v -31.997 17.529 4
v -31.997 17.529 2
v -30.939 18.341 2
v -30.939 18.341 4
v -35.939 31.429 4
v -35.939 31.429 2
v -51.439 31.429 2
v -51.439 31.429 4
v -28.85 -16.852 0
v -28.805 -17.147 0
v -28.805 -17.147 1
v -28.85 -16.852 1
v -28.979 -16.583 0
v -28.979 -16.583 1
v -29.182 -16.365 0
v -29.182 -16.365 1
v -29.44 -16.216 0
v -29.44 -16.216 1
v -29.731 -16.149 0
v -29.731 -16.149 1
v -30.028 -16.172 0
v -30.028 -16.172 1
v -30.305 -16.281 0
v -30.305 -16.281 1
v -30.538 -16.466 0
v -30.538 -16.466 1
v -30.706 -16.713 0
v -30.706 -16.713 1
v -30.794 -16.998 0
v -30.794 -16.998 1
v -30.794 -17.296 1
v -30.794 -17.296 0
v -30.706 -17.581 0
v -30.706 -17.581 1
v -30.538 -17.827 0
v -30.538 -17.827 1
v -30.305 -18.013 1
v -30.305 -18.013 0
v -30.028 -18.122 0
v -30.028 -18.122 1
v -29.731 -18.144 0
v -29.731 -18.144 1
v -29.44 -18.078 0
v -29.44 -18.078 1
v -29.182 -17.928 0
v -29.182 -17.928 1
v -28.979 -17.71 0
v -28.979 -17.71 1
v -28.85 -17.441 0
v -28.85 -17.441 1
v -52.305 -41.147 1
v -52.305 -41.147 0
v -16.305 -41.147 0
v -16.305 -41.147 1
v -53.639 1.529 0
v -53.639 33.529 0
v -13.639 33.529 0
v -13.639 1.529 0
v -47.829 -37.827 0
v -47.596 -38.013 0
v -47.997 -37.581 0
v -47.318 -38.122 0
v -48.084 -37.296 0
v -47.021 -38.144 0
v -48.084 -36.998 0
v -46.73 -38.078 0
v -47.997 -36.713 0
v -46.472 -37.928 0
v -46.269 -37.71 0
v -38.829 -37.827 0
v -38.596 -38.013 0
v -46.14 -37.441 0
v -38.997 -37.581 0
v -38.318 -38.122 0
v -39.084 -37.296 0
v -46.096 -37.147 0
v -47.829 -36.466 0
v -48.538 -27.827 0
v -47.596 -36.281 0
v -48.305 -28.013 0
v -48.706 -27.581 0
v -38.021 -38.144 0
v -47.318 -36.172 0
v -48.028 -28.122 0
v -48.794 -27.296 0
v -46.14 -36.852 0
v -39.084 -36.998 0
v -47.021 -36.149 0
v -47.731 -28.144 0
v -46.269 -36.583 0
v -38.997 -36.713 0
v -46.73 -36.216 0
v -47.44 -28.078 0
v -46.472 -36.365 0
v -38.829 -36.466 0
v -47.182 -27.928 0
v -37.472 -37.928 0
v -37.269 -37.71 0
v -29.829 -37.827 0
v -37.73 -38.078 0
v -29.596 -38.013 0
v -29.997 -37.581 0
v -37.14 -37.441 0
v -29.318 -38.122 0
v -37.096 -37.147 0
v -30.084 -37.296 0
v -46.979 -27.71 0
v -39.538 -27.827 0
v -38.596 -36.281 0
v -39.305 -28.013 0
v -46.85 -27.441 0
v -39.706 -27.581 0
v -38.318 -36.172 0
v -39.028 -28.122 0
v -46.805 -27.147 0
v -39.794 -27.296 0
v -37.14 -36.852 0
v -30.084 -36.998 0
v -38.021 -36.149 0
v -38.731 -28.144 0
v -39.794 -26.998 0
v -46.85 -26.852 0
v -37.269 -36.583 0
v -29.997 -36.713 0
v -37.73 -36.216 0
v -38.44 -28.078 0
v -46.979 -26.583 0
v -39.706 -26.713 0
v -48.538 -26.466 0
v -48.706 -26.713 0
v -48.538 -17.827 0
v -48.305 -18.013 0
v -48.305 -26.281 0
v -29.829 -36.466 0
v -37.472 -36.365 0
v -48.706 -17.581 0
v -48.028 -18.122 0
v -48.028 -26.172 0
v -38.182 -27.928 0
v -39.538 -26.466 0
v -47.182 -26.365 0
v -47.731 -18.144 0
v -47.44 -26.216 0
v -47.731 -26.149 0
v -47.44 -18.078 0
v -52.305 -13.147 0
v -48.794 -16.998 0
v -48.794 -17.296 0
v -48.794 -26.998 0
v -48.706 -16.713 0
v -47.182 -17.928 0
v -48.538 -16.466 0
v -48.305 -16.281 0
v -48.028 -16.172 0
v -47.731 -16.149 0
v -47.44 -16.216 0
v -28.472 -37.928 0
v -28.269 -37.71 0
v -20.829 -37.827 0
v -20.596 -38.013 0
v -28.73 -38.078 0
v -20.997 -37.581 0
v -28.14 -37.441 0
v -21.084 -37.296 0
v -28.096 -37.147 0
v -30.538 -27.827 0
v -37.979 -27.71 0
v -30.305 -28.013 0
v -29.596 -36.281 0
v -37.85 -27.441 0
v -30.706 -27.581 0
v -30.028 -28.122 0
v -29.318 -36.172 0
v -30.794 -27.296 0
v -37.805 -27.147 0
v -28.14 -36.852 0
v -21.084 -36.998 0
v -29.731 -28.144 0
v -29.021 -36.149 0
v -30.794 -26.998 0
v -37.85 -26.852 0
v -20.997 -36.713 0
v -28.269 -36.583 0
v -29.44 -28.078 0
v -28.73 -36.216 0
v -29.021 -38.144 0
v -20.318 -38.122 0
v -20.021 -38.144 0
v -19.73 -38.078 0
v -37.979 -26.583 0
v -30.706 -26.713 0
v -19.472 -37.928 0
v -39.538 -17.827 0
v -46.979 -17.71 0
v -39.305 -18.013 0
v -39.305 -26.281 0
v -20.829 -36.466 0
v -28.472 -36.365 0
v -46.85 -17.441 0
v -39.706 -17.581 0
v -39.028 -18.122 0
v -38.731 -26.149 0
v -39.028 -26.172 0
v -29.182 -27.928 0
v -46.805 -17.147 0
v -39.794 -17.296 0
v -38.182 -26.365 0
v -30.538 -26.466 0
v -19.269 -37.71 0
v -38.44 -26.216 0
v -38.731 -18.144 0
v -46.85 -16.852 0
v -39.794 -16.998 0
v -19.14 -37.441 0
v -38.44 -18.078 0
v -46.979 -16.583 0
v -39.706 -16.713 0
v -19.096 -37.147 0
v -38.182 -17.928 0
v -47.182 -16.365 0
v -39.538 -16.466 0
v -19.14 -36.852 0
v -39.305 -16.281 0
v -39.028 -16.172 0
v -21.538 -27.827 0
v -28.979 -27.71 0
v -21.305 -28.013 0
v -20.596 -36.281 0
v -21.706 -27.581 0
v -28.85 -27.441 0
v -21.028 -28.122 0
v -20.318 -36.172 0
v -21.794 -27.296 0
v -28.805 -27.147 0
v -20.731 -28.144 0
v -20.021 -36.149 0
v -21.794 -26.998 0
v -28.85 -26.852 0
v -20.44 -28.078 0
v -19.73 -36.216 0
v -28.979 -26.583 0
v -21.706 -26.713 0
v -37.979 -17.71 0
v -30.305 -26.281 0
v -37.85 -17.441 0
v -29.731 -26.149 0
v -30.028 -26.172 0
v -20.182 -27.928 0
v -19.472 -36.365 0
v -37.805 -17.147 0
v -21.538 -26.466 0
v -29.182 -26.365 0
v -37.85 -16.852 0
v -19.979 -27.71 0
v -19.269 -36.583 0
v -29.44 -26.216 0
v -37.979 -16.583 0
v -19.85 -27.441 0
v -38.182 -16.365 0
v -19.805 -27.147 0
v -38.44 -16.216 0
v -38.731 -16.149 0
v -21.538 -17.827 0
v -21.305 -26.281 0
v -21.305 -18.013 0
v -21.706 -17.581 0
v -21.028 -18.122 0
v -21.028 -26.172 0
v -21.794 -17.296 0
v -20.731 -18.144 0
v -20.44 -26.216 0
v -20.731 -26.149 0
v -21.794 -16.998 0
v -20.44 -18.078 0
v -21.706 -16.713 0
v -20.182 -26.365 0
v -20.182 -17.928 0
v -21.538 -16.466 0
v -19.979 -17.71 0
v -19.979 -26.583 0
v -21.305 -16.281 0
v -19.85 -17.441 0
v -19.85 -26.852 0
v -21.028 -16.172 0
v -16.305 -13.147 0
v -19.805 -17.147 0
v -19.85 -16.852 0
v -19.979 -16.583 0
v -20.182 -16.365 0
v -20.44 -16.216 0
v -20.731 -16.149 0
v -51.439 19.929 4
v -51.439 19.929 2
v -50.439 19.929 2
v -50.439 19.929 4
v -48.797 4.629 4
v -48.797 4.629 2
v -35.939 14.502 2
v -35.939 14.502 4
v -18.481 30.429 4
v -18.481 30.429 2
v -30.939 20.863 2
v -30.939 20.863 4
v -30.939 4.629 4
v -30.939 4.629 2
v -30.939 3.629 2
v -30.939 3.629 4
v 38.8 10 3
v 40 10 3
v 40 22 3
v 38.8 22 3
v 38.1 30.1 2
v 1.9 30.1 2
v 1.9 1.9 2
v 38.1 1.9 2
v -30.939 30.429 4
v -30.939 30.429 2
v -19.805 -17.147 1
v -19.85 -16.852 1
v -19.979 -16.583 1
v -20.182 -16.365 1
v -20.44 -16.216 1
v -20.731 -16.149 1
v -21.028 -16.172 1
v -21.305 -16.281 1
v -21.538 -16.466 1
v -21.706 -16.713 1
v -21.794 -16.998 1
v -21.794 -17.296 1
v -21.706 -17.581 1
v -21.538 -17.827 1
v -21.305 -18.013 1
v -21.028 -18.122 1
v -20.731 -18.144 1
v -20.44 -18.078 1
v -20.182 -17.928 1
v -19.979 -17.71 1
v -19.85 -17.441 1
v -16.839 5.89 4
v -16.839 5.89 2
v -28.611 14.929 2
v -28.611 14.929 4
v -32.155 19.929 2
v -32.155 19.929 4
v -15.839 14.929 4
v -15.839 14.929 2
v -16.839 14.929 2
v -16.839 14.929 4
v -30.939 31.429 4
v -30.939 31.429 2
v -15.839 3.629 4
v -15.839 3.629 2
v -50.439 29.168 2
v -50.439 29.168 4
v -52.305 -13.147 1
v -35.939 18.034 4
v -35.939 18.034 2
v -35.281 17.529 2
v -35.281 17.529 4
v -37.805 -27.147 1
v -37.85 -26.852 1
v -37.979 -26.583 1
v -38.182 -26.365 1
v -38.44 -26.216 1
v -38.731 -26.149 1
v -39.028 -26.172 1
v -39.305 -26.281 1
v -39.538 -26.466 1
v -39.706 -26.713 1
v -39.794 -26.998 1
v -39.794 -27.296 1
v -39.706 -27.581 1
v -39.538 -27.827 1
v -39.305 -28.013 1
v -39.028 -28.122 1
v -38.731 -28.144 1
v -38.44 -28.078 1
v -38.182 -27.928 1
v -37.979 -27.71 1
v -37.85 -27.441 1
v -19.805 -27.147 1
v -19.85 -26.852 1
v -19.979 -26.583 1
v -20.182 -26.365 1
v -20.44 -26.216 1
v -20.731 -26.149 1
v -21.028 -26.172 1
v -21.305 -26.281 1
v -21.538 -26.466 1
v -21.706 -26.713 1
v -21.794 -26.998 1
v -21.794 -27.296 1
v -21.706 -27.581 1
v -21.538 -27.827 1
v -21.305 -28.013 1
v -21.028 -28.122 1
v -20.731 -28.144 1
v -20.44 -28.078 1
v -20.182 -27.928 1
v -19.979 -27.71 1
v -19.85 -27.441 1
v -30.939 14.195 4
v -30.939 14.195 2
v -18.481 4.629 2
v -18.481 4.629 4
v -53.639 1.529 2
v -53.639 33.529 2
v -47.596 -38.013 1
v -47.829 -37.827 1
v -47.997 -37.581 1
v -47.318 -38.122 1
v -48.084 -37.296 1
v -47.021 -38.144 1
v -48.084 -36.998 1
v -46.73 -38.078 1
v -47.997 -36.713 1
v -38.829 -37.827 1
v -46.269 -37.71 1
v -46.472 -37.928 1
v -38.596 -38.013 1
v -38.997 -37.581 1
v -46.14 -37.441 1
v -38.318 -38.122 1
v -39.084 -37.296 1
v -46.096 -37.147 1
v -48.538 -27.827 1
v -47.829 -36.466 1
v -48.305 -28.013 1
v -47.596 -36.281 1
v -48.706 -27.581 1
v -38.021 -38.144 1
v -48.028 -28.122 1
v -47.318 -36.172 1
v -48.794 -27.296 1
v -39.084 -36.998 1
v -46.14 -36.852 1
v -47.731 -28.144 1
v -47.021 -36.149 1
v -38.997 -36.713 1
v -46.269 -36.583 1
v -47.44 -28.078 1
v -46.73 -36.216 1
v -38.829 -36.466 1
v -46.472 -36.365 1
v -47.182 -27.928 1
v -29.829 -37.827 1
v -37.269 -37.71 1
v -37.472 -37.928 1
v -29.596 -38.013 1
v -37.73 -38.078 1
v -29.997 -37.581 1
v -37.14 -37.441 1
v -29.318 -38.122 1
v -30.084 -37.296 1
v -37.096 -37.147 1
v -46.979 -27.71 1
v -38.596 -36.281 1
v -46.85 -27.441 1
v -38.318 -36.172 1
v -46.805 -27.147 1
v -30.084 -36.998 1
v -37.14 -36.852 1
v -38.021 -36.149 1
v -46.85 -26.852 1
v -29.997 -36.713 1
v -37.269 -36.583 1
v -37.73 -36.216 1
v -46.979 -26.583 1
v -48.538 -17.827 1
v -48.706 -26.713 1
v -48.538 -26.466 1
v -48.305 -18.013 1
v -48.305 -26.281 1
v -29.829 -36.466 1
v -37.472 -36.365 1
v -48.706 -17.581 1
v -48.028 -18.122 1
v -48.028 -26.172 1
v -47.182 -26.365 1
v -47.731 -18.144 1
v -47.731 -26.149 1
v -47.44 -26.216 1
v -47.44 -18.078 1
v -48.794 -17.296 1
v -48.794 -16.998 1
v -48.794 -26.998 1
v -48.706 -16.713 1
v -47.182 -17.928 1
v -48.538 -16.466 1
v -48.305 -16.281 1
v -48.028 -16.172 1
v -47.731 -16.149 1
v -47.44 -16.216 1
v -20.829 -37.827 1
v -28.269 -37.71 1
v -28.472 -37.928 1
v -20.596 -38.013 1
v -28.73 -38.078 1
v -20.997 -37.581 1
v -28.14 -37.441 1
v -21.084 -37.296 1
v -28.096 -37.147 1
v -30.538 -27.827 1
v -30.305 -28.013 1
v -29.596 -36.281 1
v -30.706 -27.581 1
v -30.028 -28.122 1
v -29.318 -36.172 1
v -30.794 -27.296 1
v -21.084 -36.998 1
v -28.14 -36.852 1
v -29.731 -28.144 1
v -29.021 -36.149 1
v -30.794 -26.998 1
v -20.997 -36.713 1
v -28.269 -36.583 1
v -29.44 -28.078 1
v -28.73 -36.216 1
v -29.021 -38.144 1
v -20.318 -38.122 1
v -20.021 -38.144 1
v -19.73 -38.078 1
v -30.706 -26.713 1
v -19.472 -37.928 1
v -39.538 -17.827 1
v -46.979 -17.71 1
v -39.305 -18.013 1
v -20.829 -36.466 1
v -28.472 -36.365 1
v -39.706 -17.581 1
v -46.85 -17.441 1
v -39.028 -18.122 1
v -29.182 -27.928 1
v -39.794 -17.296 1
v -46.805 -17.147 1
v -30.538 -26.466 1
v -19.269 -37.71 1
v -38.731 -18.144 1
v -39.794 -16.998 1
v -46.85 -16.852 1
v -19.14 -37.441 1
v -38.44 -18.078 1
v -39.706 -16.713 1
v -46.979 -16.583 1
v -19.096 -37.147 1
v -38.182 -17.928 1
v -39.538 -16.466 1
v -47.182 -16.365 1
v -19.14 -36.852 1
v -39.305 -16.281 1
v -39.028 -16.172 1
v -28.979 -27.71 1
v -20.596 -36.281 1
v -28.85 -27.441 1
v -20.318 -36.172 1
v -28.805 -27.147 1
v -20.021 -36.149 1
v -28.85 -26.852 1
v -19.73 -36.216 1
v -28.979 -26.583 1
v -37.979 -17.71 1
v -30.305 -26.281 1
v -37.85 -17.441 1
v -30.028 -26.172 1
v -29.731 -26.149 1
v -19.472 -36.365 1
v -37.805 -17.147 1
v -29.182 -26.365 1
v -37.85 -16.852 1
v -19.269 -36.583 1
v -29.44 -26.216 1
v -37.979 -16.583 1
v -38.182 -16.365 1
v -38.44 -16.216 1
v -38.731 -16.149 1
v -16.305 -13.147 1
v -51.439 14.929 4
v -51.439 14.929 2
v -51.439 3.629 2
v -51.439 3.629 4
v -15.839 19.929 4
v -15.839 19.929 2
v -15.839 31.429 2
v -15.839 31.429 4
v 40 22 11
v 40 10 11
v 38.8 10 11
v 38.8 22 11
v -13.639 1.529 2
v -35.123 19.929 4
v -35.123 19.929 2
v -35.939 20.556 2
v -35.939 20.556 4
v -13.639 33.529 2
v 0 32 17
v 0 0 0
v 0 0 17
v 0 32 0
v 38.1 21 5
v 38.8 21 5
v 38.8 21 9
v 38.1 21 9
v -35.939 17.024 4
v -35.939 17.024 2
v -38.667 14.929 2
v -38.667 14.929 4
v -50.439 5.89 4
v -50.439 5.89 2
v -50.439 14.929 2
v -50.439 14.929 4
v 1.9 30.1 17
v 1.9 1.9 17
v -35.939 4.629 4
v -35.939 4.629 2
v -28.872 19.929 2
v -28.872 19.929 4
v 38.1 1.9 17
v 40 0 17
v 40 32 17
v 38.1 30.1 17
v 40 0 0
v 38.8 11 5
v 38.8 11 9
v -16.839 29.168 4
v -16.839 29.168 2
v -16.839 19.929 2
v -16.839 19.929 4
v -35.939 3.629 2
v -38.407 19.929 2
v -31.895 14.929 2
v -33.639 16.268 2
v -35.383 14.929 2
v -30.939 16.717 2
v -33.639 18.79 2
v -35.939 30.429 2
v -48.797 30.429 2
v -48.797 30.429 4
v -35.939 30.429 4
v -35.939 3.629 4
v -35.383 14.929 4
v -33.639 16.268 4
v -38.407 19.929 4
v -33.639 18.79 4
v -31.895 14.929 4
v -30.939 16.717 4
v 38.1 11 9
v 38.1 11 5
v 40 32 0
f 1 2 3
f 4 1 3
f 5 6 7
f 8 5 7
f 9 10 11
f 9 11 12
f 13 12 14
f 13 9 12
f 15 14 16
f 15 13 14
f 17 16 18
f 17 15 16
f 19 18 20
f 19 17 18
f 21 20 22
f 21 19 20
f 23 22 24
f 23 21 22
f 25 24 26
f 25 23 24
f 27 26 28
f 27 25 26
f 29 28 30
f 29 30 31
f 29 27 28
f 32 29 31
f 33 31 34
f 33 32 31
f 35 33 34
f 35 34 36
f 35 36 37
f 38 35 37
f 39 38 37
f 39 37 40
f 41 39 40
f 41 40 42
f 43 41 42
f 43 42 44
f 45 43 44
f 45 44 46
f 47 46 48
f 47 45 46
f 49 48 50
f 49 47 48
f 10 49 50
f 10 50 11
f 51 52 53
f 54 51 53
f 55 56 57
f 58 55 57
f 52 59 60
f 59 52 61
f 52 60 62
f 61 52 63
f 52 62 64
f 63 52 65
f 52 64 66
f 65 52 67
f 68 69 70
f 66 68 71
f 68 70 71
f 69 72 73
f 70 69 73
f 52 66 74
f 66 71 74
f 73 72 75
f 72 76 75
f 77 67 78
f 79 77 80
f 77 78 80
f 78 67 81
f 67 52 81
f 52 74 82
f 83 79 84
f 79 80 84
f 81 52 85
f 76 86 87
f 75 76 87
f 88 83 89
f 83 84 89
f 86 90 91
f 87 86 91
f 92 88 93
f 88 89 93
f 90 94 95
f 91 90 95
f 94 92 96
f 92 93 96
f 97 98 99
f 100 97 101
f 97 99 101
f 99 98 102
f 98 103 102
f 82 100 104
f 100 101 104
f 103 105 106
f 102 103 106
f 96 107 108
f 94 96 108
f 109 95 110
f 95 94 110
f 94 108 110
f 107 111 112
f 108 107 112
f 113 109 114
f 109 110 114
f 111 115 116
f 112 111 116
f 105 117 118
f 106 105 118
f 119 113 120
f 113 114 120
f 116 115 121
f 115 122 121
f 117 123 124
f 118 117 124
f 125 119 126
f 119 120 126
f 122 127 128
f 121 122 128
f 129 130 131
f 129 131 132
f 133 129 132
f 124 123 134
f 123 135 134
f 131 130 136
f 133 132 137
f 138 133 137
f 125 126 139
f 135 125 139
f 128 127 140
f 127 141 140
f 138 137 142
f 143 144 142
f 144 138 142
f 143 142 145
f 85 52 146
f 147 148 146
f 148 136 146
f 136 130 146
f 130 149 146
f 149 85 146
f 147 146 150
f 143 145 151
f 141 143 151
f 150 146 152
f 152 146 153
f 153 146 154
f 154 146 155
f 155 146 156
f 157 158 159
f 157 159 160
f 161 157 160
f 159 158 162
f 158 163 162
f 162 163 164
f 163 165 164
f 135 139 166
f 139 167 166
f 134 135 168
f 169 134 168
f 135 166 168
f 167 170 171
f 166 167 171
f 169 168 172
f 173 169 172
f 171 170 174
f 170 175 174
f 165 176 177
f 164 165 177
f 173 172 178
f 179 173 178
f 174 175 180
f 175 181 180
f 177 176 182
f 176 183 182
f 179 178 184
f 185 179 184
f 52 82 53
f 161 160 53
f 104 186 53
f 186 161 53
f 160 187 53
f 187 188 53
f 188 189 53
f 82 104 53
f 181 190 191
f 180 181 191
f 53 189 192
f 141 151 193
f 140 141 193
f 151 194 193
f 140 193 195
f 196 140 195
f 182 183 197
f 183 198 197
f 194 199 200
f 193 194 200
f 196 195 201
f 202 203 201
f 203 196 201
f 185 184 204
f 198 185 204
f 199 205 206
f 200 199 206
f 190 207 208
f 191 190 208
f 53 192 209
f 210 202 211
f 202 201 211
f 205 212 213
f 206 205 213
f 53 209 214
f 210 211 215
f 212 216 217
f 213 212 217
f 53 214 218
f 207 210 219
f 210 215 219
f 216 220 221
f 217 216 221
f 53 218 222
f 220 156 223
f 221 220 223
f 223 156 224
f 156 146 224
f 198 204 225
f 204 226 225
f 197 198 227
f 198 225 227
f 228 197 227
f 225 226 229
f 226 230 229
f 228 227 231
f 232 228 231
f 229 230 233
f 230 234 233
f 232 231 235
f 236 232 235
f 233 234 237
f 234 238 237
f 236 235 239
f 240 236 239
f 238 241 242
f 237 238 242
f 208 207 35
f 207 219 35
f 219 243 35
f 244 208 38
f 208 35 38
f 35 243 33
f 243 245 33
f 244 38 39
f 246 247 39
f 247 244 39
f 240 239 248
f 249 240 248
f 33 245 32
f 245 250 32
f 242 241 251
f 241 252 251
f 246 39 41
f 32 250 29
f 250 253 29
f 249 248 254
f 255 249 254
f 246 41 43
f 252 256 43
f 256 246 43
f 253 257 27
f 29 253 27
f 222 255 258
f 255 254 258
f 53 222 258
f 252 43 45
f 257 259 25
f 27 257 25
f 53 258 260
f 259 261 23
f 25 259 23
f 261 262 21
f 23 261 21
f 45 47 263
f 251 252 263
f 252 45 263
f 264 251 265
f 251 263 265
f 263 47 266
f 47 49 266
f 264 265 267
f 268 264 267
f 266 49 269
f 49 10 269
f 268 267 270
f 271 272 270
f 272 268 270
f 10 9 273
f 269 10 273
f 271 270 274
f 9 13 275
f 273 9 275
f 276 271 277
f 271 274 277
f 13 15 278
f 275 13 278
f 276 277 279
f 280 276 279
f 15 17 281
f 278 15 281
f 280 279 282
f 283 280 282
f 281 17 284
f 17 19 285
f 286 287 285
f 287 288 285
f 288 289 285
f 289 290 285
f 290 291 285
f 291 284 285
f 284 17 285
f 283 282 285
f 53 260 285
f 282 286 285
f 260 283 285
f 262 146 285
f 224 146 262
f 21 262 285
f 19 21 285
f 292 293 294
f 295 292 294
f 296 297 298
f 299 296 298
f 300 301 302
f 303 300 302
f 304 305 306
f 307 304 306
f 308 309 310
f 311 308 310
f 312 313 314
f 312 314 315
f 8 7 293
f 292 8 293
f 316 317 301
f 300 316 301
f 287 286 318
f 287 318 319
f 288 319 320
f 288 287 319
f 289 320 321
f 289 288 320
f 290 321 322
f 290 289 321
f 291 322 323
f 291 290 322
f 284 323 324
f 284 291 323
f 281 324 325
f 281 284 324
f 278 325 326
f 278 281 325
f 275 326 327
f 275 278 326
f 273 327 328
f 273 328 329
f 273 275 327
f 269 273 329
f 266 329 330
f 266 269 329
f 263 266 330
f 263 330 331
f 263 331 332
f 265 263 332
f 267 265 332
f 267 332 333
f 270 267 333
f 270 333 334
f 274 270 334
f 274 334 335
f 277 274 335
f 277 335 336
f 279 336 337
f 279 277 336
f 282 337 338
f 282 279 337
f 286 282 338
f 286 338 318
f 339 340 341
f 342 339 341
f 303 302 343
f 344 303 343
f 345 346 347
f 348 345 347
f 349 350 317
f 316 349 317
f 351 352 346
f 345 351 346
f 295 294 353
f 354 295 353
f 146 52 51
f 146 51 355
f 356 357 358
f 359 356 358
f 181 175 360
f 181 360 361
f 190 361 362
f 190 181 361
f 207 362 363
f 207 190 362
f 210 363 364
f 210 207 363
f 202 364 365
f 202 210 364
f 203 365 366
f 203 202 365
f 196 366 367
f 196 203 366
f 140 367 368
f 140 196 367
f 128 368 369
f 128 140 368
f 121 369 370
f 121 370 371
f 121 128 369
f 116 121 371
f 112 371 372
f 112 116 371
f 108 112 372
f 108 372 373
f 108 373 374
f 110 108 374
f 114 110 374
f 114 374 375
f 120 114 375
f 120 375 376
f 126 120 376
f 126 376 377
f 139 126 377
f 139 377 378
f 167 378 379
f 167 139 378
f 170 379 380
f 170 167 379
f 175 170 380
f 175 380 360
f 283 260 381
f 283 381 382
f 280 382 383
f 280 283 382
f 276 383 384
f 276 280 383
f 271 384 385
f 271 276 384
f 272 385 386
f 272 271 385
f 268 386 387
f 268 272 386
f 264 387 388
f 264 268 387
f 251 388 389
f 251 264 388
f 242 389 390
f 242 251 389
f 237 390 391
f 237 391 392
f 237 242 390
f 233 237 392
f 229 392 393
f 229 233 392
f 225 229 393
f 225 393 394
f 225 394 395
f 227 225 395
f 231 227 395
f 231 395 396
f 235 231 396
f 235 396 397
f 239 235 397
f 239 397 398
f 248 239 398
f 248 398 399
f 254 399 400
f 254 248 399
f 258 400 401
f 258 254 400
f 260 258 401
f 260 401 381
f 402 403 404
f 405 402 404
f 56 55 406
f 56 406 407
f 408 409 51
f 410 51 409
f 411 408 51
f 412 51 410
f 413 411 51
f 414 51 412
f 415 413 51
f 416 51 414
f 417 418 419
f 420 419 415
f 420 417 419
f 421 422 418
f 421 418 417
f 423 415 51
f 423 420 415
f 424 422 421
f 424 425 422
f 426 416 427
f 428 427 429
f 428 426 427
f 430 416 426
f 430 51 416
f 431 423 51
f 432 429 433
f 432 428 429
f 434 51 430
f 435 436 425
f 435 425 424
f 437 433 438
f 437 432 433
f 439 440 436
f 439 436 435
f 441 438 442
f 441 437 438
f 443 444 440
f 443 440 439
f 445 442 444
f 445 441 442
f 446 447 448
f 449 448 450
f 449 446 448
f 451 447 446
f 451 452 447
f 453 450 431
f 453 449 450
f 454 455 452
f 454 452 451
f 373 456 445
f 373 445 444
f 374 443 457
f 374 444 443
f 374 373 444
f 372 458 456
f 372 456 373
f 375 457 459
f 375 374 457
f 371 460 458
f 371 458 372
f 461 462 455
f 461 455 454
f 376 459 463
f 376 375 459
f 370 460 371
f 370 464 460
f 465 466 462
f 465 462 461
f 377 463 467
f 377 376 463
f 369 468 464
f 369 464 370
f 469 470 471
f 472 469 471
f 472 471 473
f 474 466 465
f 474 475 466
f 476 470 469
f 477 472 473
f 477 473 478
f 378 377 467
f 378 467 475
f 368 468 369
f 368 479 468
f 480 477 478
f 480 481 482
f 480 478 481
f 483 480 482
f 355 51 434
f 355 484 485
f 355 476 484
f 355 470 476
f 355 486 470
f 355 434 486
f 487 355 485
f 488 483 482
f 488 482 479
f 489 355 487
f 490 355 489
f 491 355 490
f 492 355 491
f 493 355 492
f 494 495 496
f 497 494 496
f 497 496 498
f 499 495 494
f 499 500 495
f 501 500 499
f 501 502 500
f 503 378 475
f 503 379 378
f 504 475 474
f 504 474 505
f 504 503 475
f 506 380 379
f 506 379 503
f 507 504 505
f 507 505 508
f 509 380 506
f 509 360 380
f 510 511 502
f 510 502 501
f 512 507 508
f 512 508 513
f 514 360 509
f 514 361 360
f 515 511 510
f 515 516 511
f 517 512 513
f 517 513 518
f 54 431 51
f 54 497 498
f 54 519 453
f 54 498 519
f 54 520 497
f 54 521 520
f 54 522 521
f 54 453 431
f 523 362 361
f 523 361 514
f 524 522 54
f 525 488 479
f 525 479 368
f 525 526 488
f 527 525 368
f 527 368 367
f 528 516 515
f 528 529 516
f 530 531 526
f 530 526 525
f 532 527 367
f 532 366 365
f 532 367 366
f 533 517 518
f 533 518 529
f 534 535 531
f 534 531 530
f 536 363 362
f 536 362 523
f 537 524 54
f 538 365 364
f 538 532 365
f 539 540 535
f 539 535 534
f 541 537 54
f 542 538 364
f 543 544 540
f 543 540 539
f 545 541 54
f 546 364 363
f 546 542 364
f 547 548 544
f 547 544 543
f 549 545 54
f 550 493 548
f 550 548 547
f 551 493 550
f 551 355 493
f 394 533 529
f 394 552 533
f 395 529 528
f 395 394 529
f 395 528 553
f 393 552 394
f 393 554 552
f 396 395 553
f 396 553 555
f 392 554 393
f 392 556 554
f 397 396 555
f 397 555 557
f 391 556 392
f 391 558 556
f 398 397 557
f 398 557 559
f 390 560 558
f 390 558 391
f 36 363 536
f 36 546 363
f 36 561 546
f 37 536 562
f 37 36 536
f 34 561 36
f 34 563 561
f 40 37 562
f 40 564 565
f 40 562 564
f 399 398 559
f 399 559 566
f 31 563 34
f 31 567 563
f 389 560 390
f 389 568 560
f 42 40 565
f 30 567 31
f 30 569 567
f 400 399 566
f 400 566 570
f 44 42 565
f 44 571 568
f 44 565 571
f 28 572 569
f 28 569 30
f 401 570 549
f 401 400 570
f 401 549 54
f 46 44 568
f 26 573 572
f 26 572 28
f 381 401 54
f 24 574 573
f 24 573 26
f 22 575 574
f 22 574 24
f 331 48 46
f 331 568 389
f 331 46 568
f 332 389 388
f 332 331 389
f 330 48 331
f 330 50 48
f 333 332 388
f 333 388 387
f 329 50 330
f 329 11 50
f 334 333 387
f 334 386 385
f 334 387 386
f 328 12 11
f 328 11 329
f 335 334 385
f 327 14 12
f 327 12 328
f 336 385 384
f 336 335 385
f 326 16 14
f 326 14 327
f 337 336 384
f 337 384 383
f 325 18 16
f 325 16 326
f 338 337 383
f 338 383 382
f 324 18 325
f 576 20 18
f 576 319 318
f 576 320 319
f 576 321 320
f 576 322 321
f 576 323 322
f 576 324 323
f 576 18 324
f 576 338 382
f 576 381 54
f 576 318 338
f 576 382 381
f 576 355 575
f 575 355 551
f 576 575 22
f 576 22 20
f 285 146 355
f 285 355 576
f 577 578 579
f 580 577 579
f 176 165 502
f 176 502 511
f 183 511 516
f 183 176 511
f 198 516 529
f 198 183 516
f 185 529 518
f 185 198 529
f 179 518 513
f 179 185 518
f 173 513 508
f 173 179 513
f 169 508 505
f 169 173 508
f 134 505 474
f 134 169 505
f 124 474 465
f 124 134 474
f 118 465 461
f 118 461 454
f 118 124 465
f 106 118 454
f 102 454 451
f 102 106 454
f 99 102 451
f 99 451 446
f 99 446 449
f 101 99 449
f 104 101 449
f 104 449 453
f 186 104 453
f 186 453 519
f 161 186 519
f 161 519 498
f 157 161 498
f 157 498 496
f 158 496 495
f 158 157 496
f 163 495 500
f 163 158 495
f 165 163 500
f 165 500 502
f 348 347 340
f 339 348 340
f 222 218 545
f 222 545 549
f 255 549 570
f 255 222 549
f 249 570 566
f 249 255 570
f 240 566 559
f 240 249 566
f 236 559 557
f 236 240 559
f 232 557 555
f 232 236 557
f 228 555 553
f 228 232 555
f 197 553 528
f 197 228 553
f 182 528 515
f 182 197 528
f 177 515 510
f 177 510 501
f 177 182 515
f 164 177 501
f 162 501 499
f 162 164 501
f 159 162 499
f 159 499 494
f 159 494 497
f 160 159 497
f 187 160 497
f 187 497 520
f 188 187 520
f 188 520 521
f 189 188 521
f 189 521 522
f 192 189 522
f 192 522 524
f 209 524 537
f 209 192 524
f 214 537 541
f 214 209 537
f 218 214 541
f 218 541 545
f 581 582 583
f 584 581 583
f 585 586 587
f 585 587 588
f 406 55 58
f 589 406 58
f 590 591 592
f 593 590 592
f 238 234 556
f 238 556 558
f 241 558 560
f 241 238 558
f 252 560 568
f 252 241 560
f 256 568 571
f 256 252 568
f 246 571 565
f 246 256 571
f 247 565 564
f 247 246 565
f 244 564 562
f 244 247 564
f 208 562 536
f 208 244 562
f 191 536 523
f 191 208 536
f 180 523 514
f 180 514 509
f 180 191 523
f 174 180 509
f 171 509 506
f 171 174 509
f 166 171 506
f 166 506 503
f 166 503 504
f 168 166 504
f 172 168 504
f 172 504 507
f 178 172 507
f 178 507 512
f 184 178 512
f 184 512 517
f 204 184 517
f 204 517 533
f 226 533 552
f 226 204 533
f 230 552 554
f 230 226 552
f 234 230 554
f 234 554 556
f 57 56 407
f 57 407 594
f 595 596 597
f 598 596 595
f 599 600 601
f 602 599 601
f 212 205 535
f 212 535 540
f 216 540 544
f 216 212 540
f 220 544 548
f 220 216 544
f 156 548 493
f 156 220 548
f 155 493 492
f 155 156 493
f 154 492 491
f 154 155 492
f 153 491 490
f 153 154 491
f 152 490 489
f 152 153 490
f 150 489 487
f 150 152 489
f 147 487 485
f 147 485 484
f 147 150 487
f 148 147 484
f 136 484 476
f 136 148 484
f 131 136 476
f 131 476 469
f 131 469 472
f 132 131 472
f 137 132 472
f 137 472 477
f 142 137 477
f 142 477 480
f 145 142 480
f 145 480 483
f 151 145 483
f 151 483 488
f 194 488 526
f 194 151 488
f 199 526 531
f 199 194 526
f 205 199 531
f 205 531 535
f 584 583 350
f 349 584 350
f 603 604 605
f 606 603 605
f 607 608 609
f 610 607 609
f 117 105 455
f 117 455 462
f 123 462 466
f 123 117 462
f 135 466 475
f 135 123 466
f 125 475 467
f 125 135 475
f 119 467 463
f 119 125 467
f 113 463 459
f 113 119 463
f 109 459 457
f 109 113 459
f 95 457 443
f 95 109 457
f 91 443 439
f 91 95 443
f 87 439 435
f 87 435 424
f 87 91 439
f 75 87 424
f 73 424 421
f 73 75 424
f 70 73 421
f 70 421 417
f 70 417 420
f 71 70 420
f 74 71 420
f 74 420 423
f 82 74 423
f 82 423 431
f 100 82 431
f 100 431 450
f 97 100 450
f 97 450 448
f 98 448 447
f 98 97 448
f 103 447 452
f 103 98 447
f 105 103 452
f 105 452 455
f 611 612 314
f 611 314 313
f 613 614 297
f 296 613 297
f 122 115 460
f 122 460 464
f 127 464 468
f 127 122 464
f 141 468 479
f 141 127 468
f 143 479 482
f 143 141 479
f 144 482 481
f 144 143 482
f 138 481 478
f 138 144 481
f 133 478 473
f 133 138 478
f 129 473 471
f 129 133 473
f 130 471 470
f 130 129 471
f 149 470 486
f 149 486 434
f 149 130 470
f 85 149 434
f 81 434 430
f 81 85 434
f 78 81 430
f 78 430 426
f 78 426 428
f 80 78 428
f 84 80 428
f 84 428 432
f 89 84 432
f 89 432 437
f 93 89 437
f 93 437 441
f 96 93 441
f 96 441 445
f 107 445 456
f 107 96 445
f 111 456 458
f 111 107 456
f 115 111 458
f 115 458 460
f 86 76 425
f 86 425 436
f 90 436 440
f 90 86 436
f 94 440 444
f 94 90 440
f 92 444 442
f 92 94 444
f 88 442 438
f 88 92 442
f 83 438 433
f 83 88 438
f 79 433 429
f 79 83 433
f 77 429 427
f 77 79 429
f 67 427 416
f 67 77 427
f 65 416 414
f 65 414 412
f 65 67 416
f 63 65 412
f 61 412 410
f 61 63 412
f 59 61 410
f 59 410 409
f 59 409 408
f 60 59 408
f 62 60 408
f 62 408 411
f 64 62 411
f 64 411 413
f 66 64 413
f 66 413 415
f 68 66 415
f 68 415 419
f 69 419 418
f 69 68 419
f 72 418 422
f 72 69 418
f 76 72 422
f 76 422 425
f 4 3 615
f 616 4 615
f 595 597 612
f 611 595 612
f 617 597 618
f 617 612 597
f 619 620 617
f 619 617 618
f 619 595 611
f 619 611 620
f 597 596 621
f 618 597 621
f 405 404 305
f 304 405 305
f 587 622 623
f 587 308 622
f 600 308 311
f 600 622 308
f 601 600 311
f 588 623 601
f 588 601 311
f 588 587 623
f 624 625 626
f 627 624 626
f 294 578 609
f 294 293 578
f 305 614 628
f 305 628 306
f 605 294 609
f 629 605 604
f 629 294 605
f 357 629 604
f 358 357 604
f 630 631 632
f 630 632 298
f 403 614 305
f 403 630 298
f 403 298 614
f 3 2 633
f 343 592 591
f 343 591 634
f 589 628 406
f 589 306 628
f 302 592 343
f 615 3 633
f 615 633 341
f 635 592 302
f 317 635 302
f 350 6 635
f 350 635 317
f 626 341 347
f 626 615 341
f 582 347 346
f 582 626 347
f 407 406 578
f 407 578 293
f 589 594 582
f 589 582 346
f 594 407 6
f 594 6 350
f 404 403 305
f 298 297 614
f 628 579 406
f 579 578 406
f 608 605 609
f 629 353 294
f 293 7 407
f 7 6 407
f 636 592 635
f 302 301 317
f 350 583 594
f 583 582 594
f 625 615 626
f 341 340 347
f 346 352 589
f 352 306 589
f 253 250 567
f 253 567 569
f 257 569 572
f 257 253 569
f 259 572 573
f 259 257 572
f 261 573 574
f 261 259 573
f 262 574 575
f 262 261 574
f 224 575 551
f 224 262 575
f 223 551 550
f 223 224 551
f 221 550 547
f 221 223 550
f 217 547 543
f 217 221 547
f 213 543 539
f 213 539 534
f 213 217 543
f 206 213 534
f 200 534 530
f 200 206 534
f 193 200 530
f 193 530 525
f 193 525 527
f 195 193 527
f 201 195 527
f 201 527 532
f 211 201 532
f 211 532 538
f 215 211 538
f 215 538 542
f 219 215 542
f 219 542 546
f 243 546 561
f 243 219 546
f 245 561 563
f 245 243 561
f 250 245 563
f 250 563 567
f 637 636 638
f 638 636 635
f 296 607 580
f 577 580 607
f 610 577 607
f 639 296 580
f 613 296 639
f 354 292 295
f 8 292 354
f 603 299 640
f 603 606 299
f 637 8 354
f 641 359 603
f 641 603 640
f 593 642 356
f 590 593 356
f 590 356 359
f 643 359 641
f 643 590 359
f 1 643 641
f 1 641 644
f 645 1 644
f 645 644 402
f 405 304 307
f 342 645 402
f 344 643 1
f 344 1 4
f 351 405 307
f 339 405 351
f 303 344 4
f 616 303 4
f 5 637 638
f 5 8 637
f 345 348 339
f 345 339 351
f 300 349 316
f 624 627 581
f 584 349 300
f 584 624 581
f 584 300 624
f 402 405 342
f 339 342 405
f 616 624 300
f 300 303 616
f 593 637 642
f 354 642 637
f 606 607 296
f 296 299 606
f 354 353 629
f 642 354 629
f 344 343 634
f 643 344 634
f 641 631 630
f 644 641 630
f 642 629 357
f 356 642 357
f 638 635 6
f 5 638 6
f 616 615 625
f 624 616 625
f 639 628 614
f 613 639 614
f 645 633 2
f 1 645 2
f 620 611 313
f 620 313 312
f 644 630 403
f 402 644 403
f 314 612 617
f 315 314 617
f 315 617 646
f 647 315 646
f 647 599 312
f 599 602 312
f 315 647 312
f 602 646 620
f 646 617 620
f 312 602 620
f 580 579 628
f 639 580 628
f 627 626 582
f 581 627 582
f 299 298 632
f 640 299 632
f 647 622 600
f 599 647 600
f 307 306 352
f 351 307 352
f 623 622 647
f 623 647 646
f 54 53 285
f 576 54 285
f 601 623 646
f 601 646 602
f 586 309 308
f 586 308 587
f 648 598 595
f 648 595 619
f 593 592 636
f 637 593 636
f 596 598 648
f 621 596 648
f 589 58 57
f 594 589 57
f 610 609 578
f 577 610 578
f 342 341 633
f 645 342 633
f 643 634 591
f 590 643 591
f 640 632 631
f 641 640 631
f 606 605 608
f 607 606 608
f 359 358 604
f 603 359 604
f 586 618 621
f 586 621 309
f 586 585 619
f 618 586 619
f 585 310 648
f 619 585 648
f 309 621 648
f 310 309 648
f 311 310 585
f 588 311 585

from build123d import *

# Parameters (mm, degrees)
F0_W      = 40
F0_H      = 32
F1_DEPTH  = 17
F2_W      = 36.2
F2_H      = 28.2
F3_DEPTH  = 15
F4_W      = 10
F4_H      = 4
F5_DEPTH  = 1.9
F6_W      = 40
F6_H      = 32
F7_DEPTH  = 2
F9_DEPTH  = 2
F4_W_2    = 12
F4_H_2    = 8
F10_DEPTH = 1.2
F11_W     = 36
F11_H     = 28
F11_R     = 1
F12_DEPTH = 1


with BuildPart() as f1:
    # F0 (on Top) → F1 (new body)
    with BuildSketch(Plane.XY):
        with Locations((20, 16)):
            Rectangle(F0_W, F0_H)
    extrude(amount=F1_DEPTH)

    # F2 (on face) → F3 (cut)
    with BuildSketch(Plane.XY.offset(17)):
        with Locations((20, 16)):
            Rectangle(F2_W, F2_H)
    extrude(amount=-F3_DEPTH, mode=Mode.SUBTRACT)

    # F4 (on face) → F5 (cut, through all)
    with BuildSketch(Plane.YZ.offset(40)):
        with Locations((16, 7)):
            Rectangle(F4_W, F4_H)
    extrude(amount=-F5_DEPTH, mode=Mode.SUBTRACT)

    # F4 (on face) → F10 (cut)
    with BuildSketch(Plane.YZ.offset(40)):
        with Locations((16, 7)):
            Rectangle(F4_W_2, F4_H_2)
        with Locations((16, 7)):
            Rectangle(F4_W, F4_H, mode=Mode.SUBTRACT)
    extrude(amount=-F10_DEPTH, mode=Mode.SUBTRACT)


with BuildPart() as f7:
    # F6 (on Top) → F7 (new body)
    with BuildSketch(Plane.XY):
        with Locations((-33.6390890081, 17.5289876275)):
            Rectangle(F6_W, F6_H)
    extrude(amount=F7_DEPTH)

    # F8 (on face) → F9 (join)
    with BuildSketch(Plane.XY.offset(2)):
        Polygon((-35.9390890081, 31.4289876275), (-51.4390890081, 31.4289876275), (-51.4390890081, 19.9289876275), (-50.4390890081, 19.9289876275), (-50.4390890081, 29.1681924055), (-50.4390890081, 30.4289876275), (-48.7971231376, 30.4289876275), (-35.9390890081, 30.4289876275), align=None)
        Polygon((-15.8390890081, 31.4289876275), (-30.9390890081, 31.4289876275), (-30.9390890081, 30.4289876275), (-18.4810548786, 30.4289876275), (-16.8390890081, 30.4289876275), (-16.8390890081, 29.1681924055), (-16.8390890081, 19.9289876275), (-15.8390890081, 19.9289876275), align=None)
        Polygon((-50.4390890081, 30.4289876275), (-50.4390890081, 29.1681924055), (-38.406636274, 19.9289876275), (-36.7646704035, 19.9289876275), align=None)
        Polygon((-35.9390890081, 20.5558542781), (-48.7971231376, 30.4289876275), (-50.4390890081, 30.4289876275), (-36.7646704035, 19.9289876275), (-35.9390890081, 19.9289876275), align=None)
        Polygon((-32.8181060728, 18.1593852385), (-33.6390890081, 18.7897828495), (-34.4600719434, 18.1593852385), (-33.6390890081, 17.5289876275), align=None)
        Polygon((-31.9971231376, 17.5289876275), (-32.8181060728, 18.1593852385), (-33.6390890081, 17.5289876275), (-32.8181060728, 16.8985900165), align=None)
        Polygon((-34.4600719434, 18.1593852385), (-35.2810548786, 17.5289876275), (-34.4600719434, 16.8985900165), (-33.6390890081, 17.5289876275), align=None)
        Polygon((-33.6390890081, 17.5289876275), (-34.4600719434, 16.8985900165), (-33.6390890081, 16.2681924055), (-32.8181060728, 16.8985900165), align=None)
        Polygon((-30.9390890081, 18.3414066912), (-30.9390890081, 19.6022019132), (-32.8181060728, 18.1593852385), (-31.9971231376, 17.5289876275), align=None)
        Polygon((-30.9390890081, 19.9289876275), (-32.1554734833, 19.9289876275), (-33.6390890081, 18.7897828495), (-32.8181060728, 18.1593852385), (-30.9390890081, 19.6022019132), align=None)
        Polygon((-35.2810548786, 17.5289876275), (-35.9390890081, 17.0237114209), (-35.9390890081, 15.7629161989), (-34.4600719434, 16.8985900165), align=None)
        Polygon((-34.4600719434, 16.8985900165), (-35.9390890081, 15.7629161989), (-35.9390890081, 14.9289876275), (-35.3831696492, 14.9289876275), (-33.6390890081, 16.2681924055), align=None)
        Polygon((-30.9390890081, 14.1949781198), (-18.4810548786, 4.6289876275), (-16.8390890081, 4.6289876275), (-30.2530424965, 14.9289876275), (-30.9390890081, 14.9289876275), align=None)
        Polygon((-16.8390890081, 4.6289876275), (-16.8390890081, 5.8897828495), (-28.611076626, 14.9289876275), (-30.2530424965, 14.9289876275), align=None)
        Polygon((-35.9390890081, 17.0237114209), (-38.6671013903, 14.9289876275), (-37.0251355197, 14.9289876275), (-35.9390890081, 15.7629161989), align=None)
        Polygon((-36.7646704035, 19.9289876275), (-38.406636274, 19.9289876275), (-35.9390890081, 18.034263834), (-35.9390890081, 19.295059056), align=None)
        Polygon((-35.9390890081, 19.295059056), (-35.9390890081, 18.034263834), (-35.2810548786, 17.5289876275), (-34.4600719434, 18.1593852385), align=None)
        Polygon((-33.6390890081, 18.7897828495), (-35.1227045329, 19.9289876275), (-35.9390890081, 19.9289876275), (-35.9390890081, 19.295059056), (-34.4600719434, 18.1593852385), align=None)
        Polygon((-35.1227045329, 19.9289876275), (-35.9390890081, 20.5558542781), (-35.9390890081, 19.9289876275), align=None)
        Polygon((-35.9390890081, 15.7629161989), (-37.0251355197, 14.9289876275), (-35.9390890081, 14.9289876275), align=None)
        Polygon((-32.8181060728, 16.8985900165), (-33.6390890081, 16.2681924055), (-31.895008367, 14.9289876275), (-30.9390890081, 14.9289876275), (-30.9390890081, 15.4557733418), align=None)
        Polygon((-30.9390890081, 16.7165685638), (-31.9971231376, 17.5289876275), (-32.8181060728, 16.8985900165), (-30.9390890081, 15.4557733418), align=None)
        Polygon((-30.2530424965, 14.9289876275), (-28.611076626, 14.9289876275), (-30.9390890081, 16.7165685638), (-30.9390890081, 15.4557733418), align=None)
        Polygon((-30.9390890081, 14.9289876275), (-30.2530424965, 14.9289876275), (-30.9390890081, 15.4557733418), align=None)
        Polygon((-31.895008367, 14.9289876275), (-30.9390890081, 14.1949781198), (-30.9390890081, 14.9289876275), align=None)
        Polygon((-35.9390890081, 19.295059056), (-35.9390890081, 19.9289876275), (-36.7646704035, 19.9289876275), align=None)
        Polygon((-30.9390890081, 18.3414066912), (-28.8715417422, 19.9289876275), (-30.5135076128, 19.9289876275), (-30.9390890081, 19.6022019132), align=None)
        Polygon((-30.5135076128, 19.9289876275), (-30.9390890081, 19.9289876275), (-30.9390890081, 19.6022019132), align=None)
        Polygon((-30.9390890081, 19.9289876275), (-30.9390890081, 20.8629971352), (-32.1554734833, 19.9289876275), align=None)
        Polygon((-16.8390890081, 30.4289876275), (-18.4810548786, 30.4289876275), (-30.9390890081, 20.8629971352), (-30.9390890081, 19.9289876275), (-30.5135076128, 19.9289876275), align=None)
        Polygon((-16.8390890081, 29.1681924055), (-16.8390890081, 30.4289876275), (-30.5135076128, 19.9289876275), (-28.8715417422, 19.9289876275), align=None)
        Polygon((-37.0251355197, 14.9289876275), (-50.4390890081, 4.6289876275), (-48.7971231376, 4.6289876275), (-35.9390890081, 14.5021209769), (-35.9390890081, 14.9289876275), align=None)
        Polygon((-38.6671013903, 14.9289876275), (-50.4390890081, 5.8897828495), (-50.4390890081, 4.6289876275), (-37.0251355197, 14.9289876275), align=None)
        Polygon((-50.4390890081, 14.9289876275), (-51.4390890081, 14.9289876275), (-51.4390890081, 3.6289876275), (-35.9390890081, 3.6289876275), (-35.9390890081, 4.6289876275), (-48.7971231376, 4.6289876275), (-50.4390890081, 4.6289876275), (-50.4390890081, 5.8897828495), align=None)
        Polygon((-15.8390890081, 3.6289876275), (-15.8390890081, 14.9289876275), (-16.8390890081, 14.9289876275), (-16.8390890081, 5.8897828495), (-16.8390890081, 4.6289876275), (-18.4810548786, 4.6289876275), (-30.9390890081, 4.6289876275), (-30.9390890081, 3.6289876275), align=None)
        Polygon((-35.9390890081, 14.9289876275), (-35.9390890081, 14.5021209769), (-35.3831696492, 14.9289876275), align=None)
    extrude(amount=F9_DEPTH)


with BuildPart() as f12:
    # F11 (on Top) → F12 (new body)
    with BuildSketch(Plane.XY):
        with Locations((-34.3054247797, -27.1466679312)):
            Rectangle(F11_W, F11_H)
        with Locations((-47.0955419362, -37.1466679312)):
            Circle(F11_R, mode=Mode.SUBTRACT)
        with Locations((-38.0955419362, -37.1466679312)):
            Circle(F11_R, mode=Mode.SUBTRACT)
        with Locations((-29.0955419362, -37.1466679312)):
            Circle(F11_R, mode=Mode.SUBTRACT)
        with Locations((-20.0955419362, -37.1466679312)):
            Circle(F11_R, mode=Mode.SUBTRACT)
        with Locations((-47.8054247797, -27.1466679312)):
            Circle(F11_R, mode=Mode.SUBTRACT)
        with Locations((-38.8054247797, -27.1466679312)):
            Circle(F11_R, mode=Mode.SUBTRACT)
        with Locations((-47.8054247797, -17.1466679312)):
            Circle(F11_R, mode=Mode.SUBTRACT)
        with Locations((-38.8054247797, -17.1466679312)):
            Circle(F11_R, mode=Mode.SUBTRACT)
        with Locations((-29.8054247797, -27.1466679312)):
            Circle(F11_R, mode=Mode.SUBTRACT)
        with Locations((-20.8054247797, -27.1466679312)):
            Circle(F11_R, mode=Mode.SUBTRACT)
        with Locations((-29.8054247797, -17.1466679312)):
            Circle(F11_R, mode=Mode.SUBTRACT)
        with Locations((-20.8054247797, -17.1466679312)):
            Circle(F11_R, mode=Mode.SUBTRACT)
    extrude(amount=F12_DEPTH)


solid = Compound([f1.part, f7.part, f12.part])
